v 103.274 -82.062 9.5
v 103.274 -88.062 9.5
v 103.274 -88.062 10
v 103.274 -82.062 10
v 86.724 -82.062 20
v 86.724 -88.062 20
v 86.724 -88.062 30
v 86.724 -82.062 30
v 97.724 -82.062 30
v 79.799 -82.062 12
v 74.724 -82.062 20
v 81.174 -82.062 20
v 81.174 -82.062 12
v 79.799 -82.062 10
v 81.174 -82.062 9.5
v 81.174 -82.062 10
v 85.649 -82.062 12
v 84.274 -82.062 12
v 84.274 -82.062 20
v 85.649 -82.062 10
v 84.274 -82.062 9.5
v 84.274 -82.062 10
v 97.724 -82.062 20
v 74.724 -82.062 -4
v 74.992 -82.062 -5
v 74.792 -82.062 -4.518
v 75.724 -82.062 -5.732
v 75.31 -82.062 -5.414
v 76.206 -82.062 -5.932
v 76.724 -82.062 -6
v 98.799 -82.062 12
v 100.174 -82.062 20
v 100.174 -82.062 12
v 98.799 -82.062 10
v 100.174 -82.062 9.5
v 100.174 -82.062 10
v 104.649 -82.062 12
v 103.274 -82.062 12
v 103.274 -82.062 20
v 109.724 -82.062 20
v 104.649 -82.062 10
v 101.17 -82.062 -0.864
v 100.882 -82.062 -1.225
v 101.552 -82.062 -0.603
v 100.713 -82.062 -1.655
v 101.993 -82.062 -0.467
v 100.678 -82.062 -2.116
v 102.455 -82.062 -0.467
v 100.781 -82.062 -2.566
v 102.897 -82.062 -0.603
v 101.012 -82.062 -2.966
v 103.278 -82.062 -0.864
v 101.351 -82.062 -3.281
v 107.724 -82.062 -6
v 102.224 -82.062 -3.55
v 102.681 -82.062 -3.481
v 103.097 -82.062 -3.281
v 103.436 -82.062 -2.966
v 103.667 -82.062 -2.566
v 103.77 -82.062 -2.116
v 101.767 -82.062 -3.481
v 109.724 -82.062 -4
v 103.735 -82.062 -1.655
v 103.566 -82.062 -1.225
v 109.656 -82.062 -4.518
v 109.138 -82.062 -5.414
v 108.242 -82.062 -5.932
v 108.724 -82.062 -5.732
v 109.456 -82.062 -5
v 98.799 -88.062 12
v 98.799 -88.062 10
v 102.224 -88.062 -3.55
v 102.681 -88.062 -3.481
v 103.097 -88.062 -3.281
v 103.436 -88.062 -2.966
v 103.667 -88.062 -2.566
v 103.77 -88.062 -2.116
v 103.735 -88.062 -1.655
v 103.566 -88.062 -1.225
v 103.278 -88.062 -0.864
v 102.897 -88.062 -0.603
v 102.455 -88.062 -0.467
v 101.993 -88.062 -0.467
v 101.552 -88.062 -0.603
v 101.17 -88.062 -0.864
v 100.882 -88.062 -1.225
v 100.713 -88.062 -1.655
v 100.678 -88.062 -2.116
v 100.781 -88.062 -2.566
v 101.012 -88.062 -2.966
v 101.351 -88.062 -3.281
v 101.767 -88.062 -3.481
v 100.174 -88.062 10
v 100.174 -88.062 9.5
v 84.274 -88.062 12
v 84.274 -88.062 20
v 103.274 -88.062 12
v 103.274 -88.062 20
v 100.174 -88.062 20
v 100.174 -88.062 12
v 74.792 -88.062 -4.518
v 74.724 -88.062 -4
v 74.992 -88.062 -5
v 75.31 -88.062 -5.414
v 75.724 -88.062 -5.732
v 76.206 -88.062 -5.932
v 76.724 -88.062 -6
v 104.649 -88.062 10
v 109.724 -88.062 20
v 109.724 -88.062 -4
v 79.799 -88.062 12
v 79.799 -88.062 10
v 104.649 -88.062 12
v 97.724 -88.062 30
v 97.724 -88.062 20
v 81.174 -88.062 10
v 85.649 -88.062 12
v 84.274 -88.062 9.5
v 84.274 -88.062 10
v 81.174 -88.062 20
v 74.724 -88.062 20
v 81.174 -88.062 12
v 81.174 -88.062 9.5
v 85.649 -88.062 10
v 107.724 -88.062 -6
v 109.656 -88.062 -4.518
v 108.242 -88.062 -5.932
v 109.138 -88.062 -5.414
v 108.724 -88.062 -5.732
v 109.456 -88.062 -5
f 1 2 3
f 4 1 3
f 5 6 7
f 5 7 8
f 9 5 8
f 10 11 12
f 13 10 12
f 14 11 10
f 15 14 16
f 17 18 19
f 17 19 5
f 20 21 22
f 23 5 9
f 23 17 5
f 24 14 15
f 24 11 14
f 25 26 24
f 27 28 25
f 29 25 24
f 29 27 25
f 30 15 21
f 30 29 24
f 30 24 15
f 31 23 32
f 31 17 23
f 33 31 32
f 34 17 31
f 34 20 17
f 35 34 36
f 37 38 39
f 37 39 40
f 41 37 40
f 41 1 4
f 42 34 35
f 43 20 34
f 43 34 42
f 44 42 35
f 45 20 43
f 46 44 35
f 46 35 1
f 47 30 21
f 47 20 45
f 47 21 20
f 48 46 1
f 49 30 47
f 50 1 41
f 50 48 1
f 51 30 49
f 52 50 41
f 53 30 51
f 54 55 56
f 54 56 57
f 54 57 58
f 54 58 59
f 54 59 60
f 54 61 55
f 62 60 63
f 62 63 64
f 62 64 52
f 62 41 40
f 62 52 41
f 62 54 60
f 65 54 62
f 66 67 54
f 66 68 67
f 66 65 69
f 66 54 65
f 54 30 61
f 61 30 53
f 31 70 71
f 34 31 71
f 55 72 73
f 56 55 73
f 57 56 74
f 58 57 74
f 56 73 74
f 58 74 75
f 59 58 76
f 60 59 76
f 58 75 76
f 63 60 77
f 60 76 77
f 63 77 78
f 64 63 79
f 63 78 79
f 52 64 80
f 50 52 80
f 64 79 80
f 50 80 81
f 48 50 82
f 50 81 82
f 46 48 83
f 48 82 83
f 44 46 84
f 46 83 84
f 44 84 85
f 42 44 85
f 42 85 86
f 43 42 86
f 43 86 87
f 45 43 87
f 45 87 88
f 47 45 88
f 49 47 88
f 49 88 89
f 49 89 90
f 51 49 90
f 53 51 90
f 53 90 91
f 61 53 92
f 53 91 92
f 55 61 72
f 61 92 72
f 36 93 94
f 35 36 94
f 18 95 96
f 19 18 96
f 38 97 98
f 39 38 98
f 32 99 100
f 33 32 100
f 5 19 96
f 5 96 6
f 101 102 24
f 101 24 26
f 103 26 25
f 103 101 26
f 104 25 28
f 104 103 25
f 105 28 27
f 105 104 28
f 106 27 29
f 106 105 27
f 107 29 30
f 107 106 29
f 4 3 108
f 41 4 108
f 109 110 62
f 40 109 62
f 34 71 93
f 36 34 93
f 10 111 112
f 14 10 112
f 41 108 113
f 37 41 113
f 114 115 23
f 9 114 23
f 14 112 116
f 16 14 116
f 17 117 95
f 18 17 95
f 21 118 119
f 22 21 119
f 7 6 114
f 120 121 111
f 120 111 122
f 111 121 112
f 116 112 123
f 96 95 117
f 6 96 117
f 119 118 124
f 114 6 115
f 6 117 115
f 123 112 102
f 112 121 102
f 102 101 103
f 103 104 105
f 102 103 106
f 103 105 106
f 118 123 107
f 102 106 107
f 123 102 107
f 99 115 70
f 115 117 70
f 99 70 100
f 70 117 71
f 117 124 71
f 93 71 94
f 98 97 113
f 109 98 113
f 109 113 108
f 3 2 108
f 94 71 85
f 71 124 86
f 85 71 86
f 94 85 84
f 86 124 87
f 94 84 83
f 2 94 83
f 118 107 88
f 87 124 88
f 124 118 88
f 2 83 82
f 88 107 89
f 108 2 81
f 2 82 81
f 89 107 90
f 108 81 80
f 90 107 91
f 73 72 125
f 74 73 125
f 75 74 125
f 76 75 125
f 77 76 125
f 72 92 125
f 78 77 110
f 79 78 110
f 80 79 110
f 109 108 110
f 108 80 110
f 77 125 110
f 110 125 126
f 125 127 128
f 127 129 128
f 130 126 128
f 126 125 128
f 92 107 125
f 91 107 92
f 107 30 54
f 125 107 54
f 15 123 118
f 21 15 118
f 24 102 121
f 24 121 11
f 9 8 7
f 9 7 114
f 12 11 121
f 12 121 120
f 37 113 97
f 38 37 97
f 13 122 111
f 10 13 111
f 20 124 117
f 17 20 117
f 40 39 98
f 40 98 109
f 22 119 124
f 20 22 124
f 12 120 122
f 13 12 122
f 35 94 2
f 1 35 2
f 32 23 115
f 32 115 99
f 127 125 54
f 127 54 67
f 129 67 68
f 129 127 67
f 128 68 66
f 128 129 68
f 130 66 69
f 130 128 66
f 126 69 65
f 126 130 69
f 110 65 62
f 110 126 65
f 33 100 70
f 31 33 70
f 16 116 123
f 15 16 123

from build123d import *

# Parameters (mm, degrees)
DODANIE_WYCI_GNI_CIE1_DEPTH      = 20
DODANIE_WYCI_GNI_CIE1_DEPTH_BACK = 6
SZKIC1_W                         = 35
SZKIC1_H                         = 6
WYTNIJ_WYCI_GNI_CIE1_DEPTH       = 112.693205508
SZKIC4_R                         = 1.55
WYTNIJ_WYCI_GNI_CIE2_DEPTH       = 6
SZKIC6_W                         = 11
SZKIC6_H                         = 6
DODANIE_WYCI_GNI_CIE2_DEPTH      = 10
SZYK_LINIOWY1_COUNT              = 2
SZYK_LINIOWY1_PITCH              = 19
WYTNIJ_WYCI_GNI_CIE3_DEPTH       = 6


with BuildPart() as part:
    # Szkic1 → Dodanie-wyciągnięcie1 (new, two sides: drawn at the far end of the back side and taken through both)
    with BuildSketch(Plane.XY.offset(-DODANIE_WYCI_GNI_CIE1_DEPTH_BACK)):
        with Locations((92.224072822, -85.062373271)):
            Rectangle(SZKIC1_W, SZKIC1_H)
    extrude(amount=DODANIE_WYCI_GNI_CIE1_DEPTH + DODANIE_WYCI_GNI_CIE1_DEPTH_BACK)

    # Szkic3 → Wytnij-wyciągnięcie1 (cut, through all)
    with BuildSketch(Plane.XZ.offset(88.062373271)):
        Polygon((103.274072822, 20), (100.174072822, 20), (100.174072822, 12), (98.799072822, 12), (98.799072822, 10), (100.174072822, 10), (100.174072822, 9.5), (103.274072822, 9.5), (103.274072822, 10), (104.649072822, 10), (104.649072822, 12), (103.274072822, 12), align=None)
    wytnij_wyci_gni_cie1 = extrude(amount=-WYTNIJ_WYCI_GNI_CIE1_DEPTH, mode=Mode.SUBTRACT)

    # Szkic4 → Wytnij-wyciągnięcie2 (cut)
    with BuildSketch(Plane.XZ.offset(88.062373271)):
        with Locations(Location((102.224072822, -2, 0), (0, 0, 270))):
            Circle(SZKIC4_R)
    extrude(amount=-WYTNIJ_WYCI_GNI_CIE2_DEPTH, mode=Mode.SUBTRACT)

    # Szkic6 → Dodanie-wyciągnięcie2 (add)
    with BuildSketch(Plane.XY.offset(20)):
        with Locations((92.224072822, -85.062373271)):
            Rectangle(SZKIC6_W, SZKIC6_H)
    extrude(amount=DODANIE_WYCI_GNI_CIE2_DEPTH)

    # Szyk liniowy1: Wytnij-wyciągnięcie1 ×2
    with Locations(*[(-i * SZYK_LINIOWY1_PITCH, 0, 0) for i in range(1, SZYK_LINIOWY1_COUNT)]):
        add(wytnij_wyci_gni_cie1, mode=Mode.SUBTRACT)

    # Szkic7 → Wytnij-wyciągnięcie3 (cut)
    with BuildSketch(Plane.XZ.offset(88.062373271)):
        with BuildLine():
            Line((109.724072822, -4), (109.724072822, -6))
            Line((109.724072822, -6), (107.724072822, -6))
            ThreePointArc((107.724072822, -6), (109.138286384, -5.414213562), (109.724072822, -4))
        make_face()
        with BuildLine():
            Line((76.724072822, -6), (74.724072822, -6))
            Line((74.724072822, -6), (74.724072822, -4))
            ThreePointArc((74.724072822, -4), (75.30985926, -5.414213562), (76.724072822, -6))
        make_face()
    extrude(amount=-WYTNIJ_WYCI_GNI_CIE3_DEPTH, mode=Mode.SUBTRACT)


solid = part.part
